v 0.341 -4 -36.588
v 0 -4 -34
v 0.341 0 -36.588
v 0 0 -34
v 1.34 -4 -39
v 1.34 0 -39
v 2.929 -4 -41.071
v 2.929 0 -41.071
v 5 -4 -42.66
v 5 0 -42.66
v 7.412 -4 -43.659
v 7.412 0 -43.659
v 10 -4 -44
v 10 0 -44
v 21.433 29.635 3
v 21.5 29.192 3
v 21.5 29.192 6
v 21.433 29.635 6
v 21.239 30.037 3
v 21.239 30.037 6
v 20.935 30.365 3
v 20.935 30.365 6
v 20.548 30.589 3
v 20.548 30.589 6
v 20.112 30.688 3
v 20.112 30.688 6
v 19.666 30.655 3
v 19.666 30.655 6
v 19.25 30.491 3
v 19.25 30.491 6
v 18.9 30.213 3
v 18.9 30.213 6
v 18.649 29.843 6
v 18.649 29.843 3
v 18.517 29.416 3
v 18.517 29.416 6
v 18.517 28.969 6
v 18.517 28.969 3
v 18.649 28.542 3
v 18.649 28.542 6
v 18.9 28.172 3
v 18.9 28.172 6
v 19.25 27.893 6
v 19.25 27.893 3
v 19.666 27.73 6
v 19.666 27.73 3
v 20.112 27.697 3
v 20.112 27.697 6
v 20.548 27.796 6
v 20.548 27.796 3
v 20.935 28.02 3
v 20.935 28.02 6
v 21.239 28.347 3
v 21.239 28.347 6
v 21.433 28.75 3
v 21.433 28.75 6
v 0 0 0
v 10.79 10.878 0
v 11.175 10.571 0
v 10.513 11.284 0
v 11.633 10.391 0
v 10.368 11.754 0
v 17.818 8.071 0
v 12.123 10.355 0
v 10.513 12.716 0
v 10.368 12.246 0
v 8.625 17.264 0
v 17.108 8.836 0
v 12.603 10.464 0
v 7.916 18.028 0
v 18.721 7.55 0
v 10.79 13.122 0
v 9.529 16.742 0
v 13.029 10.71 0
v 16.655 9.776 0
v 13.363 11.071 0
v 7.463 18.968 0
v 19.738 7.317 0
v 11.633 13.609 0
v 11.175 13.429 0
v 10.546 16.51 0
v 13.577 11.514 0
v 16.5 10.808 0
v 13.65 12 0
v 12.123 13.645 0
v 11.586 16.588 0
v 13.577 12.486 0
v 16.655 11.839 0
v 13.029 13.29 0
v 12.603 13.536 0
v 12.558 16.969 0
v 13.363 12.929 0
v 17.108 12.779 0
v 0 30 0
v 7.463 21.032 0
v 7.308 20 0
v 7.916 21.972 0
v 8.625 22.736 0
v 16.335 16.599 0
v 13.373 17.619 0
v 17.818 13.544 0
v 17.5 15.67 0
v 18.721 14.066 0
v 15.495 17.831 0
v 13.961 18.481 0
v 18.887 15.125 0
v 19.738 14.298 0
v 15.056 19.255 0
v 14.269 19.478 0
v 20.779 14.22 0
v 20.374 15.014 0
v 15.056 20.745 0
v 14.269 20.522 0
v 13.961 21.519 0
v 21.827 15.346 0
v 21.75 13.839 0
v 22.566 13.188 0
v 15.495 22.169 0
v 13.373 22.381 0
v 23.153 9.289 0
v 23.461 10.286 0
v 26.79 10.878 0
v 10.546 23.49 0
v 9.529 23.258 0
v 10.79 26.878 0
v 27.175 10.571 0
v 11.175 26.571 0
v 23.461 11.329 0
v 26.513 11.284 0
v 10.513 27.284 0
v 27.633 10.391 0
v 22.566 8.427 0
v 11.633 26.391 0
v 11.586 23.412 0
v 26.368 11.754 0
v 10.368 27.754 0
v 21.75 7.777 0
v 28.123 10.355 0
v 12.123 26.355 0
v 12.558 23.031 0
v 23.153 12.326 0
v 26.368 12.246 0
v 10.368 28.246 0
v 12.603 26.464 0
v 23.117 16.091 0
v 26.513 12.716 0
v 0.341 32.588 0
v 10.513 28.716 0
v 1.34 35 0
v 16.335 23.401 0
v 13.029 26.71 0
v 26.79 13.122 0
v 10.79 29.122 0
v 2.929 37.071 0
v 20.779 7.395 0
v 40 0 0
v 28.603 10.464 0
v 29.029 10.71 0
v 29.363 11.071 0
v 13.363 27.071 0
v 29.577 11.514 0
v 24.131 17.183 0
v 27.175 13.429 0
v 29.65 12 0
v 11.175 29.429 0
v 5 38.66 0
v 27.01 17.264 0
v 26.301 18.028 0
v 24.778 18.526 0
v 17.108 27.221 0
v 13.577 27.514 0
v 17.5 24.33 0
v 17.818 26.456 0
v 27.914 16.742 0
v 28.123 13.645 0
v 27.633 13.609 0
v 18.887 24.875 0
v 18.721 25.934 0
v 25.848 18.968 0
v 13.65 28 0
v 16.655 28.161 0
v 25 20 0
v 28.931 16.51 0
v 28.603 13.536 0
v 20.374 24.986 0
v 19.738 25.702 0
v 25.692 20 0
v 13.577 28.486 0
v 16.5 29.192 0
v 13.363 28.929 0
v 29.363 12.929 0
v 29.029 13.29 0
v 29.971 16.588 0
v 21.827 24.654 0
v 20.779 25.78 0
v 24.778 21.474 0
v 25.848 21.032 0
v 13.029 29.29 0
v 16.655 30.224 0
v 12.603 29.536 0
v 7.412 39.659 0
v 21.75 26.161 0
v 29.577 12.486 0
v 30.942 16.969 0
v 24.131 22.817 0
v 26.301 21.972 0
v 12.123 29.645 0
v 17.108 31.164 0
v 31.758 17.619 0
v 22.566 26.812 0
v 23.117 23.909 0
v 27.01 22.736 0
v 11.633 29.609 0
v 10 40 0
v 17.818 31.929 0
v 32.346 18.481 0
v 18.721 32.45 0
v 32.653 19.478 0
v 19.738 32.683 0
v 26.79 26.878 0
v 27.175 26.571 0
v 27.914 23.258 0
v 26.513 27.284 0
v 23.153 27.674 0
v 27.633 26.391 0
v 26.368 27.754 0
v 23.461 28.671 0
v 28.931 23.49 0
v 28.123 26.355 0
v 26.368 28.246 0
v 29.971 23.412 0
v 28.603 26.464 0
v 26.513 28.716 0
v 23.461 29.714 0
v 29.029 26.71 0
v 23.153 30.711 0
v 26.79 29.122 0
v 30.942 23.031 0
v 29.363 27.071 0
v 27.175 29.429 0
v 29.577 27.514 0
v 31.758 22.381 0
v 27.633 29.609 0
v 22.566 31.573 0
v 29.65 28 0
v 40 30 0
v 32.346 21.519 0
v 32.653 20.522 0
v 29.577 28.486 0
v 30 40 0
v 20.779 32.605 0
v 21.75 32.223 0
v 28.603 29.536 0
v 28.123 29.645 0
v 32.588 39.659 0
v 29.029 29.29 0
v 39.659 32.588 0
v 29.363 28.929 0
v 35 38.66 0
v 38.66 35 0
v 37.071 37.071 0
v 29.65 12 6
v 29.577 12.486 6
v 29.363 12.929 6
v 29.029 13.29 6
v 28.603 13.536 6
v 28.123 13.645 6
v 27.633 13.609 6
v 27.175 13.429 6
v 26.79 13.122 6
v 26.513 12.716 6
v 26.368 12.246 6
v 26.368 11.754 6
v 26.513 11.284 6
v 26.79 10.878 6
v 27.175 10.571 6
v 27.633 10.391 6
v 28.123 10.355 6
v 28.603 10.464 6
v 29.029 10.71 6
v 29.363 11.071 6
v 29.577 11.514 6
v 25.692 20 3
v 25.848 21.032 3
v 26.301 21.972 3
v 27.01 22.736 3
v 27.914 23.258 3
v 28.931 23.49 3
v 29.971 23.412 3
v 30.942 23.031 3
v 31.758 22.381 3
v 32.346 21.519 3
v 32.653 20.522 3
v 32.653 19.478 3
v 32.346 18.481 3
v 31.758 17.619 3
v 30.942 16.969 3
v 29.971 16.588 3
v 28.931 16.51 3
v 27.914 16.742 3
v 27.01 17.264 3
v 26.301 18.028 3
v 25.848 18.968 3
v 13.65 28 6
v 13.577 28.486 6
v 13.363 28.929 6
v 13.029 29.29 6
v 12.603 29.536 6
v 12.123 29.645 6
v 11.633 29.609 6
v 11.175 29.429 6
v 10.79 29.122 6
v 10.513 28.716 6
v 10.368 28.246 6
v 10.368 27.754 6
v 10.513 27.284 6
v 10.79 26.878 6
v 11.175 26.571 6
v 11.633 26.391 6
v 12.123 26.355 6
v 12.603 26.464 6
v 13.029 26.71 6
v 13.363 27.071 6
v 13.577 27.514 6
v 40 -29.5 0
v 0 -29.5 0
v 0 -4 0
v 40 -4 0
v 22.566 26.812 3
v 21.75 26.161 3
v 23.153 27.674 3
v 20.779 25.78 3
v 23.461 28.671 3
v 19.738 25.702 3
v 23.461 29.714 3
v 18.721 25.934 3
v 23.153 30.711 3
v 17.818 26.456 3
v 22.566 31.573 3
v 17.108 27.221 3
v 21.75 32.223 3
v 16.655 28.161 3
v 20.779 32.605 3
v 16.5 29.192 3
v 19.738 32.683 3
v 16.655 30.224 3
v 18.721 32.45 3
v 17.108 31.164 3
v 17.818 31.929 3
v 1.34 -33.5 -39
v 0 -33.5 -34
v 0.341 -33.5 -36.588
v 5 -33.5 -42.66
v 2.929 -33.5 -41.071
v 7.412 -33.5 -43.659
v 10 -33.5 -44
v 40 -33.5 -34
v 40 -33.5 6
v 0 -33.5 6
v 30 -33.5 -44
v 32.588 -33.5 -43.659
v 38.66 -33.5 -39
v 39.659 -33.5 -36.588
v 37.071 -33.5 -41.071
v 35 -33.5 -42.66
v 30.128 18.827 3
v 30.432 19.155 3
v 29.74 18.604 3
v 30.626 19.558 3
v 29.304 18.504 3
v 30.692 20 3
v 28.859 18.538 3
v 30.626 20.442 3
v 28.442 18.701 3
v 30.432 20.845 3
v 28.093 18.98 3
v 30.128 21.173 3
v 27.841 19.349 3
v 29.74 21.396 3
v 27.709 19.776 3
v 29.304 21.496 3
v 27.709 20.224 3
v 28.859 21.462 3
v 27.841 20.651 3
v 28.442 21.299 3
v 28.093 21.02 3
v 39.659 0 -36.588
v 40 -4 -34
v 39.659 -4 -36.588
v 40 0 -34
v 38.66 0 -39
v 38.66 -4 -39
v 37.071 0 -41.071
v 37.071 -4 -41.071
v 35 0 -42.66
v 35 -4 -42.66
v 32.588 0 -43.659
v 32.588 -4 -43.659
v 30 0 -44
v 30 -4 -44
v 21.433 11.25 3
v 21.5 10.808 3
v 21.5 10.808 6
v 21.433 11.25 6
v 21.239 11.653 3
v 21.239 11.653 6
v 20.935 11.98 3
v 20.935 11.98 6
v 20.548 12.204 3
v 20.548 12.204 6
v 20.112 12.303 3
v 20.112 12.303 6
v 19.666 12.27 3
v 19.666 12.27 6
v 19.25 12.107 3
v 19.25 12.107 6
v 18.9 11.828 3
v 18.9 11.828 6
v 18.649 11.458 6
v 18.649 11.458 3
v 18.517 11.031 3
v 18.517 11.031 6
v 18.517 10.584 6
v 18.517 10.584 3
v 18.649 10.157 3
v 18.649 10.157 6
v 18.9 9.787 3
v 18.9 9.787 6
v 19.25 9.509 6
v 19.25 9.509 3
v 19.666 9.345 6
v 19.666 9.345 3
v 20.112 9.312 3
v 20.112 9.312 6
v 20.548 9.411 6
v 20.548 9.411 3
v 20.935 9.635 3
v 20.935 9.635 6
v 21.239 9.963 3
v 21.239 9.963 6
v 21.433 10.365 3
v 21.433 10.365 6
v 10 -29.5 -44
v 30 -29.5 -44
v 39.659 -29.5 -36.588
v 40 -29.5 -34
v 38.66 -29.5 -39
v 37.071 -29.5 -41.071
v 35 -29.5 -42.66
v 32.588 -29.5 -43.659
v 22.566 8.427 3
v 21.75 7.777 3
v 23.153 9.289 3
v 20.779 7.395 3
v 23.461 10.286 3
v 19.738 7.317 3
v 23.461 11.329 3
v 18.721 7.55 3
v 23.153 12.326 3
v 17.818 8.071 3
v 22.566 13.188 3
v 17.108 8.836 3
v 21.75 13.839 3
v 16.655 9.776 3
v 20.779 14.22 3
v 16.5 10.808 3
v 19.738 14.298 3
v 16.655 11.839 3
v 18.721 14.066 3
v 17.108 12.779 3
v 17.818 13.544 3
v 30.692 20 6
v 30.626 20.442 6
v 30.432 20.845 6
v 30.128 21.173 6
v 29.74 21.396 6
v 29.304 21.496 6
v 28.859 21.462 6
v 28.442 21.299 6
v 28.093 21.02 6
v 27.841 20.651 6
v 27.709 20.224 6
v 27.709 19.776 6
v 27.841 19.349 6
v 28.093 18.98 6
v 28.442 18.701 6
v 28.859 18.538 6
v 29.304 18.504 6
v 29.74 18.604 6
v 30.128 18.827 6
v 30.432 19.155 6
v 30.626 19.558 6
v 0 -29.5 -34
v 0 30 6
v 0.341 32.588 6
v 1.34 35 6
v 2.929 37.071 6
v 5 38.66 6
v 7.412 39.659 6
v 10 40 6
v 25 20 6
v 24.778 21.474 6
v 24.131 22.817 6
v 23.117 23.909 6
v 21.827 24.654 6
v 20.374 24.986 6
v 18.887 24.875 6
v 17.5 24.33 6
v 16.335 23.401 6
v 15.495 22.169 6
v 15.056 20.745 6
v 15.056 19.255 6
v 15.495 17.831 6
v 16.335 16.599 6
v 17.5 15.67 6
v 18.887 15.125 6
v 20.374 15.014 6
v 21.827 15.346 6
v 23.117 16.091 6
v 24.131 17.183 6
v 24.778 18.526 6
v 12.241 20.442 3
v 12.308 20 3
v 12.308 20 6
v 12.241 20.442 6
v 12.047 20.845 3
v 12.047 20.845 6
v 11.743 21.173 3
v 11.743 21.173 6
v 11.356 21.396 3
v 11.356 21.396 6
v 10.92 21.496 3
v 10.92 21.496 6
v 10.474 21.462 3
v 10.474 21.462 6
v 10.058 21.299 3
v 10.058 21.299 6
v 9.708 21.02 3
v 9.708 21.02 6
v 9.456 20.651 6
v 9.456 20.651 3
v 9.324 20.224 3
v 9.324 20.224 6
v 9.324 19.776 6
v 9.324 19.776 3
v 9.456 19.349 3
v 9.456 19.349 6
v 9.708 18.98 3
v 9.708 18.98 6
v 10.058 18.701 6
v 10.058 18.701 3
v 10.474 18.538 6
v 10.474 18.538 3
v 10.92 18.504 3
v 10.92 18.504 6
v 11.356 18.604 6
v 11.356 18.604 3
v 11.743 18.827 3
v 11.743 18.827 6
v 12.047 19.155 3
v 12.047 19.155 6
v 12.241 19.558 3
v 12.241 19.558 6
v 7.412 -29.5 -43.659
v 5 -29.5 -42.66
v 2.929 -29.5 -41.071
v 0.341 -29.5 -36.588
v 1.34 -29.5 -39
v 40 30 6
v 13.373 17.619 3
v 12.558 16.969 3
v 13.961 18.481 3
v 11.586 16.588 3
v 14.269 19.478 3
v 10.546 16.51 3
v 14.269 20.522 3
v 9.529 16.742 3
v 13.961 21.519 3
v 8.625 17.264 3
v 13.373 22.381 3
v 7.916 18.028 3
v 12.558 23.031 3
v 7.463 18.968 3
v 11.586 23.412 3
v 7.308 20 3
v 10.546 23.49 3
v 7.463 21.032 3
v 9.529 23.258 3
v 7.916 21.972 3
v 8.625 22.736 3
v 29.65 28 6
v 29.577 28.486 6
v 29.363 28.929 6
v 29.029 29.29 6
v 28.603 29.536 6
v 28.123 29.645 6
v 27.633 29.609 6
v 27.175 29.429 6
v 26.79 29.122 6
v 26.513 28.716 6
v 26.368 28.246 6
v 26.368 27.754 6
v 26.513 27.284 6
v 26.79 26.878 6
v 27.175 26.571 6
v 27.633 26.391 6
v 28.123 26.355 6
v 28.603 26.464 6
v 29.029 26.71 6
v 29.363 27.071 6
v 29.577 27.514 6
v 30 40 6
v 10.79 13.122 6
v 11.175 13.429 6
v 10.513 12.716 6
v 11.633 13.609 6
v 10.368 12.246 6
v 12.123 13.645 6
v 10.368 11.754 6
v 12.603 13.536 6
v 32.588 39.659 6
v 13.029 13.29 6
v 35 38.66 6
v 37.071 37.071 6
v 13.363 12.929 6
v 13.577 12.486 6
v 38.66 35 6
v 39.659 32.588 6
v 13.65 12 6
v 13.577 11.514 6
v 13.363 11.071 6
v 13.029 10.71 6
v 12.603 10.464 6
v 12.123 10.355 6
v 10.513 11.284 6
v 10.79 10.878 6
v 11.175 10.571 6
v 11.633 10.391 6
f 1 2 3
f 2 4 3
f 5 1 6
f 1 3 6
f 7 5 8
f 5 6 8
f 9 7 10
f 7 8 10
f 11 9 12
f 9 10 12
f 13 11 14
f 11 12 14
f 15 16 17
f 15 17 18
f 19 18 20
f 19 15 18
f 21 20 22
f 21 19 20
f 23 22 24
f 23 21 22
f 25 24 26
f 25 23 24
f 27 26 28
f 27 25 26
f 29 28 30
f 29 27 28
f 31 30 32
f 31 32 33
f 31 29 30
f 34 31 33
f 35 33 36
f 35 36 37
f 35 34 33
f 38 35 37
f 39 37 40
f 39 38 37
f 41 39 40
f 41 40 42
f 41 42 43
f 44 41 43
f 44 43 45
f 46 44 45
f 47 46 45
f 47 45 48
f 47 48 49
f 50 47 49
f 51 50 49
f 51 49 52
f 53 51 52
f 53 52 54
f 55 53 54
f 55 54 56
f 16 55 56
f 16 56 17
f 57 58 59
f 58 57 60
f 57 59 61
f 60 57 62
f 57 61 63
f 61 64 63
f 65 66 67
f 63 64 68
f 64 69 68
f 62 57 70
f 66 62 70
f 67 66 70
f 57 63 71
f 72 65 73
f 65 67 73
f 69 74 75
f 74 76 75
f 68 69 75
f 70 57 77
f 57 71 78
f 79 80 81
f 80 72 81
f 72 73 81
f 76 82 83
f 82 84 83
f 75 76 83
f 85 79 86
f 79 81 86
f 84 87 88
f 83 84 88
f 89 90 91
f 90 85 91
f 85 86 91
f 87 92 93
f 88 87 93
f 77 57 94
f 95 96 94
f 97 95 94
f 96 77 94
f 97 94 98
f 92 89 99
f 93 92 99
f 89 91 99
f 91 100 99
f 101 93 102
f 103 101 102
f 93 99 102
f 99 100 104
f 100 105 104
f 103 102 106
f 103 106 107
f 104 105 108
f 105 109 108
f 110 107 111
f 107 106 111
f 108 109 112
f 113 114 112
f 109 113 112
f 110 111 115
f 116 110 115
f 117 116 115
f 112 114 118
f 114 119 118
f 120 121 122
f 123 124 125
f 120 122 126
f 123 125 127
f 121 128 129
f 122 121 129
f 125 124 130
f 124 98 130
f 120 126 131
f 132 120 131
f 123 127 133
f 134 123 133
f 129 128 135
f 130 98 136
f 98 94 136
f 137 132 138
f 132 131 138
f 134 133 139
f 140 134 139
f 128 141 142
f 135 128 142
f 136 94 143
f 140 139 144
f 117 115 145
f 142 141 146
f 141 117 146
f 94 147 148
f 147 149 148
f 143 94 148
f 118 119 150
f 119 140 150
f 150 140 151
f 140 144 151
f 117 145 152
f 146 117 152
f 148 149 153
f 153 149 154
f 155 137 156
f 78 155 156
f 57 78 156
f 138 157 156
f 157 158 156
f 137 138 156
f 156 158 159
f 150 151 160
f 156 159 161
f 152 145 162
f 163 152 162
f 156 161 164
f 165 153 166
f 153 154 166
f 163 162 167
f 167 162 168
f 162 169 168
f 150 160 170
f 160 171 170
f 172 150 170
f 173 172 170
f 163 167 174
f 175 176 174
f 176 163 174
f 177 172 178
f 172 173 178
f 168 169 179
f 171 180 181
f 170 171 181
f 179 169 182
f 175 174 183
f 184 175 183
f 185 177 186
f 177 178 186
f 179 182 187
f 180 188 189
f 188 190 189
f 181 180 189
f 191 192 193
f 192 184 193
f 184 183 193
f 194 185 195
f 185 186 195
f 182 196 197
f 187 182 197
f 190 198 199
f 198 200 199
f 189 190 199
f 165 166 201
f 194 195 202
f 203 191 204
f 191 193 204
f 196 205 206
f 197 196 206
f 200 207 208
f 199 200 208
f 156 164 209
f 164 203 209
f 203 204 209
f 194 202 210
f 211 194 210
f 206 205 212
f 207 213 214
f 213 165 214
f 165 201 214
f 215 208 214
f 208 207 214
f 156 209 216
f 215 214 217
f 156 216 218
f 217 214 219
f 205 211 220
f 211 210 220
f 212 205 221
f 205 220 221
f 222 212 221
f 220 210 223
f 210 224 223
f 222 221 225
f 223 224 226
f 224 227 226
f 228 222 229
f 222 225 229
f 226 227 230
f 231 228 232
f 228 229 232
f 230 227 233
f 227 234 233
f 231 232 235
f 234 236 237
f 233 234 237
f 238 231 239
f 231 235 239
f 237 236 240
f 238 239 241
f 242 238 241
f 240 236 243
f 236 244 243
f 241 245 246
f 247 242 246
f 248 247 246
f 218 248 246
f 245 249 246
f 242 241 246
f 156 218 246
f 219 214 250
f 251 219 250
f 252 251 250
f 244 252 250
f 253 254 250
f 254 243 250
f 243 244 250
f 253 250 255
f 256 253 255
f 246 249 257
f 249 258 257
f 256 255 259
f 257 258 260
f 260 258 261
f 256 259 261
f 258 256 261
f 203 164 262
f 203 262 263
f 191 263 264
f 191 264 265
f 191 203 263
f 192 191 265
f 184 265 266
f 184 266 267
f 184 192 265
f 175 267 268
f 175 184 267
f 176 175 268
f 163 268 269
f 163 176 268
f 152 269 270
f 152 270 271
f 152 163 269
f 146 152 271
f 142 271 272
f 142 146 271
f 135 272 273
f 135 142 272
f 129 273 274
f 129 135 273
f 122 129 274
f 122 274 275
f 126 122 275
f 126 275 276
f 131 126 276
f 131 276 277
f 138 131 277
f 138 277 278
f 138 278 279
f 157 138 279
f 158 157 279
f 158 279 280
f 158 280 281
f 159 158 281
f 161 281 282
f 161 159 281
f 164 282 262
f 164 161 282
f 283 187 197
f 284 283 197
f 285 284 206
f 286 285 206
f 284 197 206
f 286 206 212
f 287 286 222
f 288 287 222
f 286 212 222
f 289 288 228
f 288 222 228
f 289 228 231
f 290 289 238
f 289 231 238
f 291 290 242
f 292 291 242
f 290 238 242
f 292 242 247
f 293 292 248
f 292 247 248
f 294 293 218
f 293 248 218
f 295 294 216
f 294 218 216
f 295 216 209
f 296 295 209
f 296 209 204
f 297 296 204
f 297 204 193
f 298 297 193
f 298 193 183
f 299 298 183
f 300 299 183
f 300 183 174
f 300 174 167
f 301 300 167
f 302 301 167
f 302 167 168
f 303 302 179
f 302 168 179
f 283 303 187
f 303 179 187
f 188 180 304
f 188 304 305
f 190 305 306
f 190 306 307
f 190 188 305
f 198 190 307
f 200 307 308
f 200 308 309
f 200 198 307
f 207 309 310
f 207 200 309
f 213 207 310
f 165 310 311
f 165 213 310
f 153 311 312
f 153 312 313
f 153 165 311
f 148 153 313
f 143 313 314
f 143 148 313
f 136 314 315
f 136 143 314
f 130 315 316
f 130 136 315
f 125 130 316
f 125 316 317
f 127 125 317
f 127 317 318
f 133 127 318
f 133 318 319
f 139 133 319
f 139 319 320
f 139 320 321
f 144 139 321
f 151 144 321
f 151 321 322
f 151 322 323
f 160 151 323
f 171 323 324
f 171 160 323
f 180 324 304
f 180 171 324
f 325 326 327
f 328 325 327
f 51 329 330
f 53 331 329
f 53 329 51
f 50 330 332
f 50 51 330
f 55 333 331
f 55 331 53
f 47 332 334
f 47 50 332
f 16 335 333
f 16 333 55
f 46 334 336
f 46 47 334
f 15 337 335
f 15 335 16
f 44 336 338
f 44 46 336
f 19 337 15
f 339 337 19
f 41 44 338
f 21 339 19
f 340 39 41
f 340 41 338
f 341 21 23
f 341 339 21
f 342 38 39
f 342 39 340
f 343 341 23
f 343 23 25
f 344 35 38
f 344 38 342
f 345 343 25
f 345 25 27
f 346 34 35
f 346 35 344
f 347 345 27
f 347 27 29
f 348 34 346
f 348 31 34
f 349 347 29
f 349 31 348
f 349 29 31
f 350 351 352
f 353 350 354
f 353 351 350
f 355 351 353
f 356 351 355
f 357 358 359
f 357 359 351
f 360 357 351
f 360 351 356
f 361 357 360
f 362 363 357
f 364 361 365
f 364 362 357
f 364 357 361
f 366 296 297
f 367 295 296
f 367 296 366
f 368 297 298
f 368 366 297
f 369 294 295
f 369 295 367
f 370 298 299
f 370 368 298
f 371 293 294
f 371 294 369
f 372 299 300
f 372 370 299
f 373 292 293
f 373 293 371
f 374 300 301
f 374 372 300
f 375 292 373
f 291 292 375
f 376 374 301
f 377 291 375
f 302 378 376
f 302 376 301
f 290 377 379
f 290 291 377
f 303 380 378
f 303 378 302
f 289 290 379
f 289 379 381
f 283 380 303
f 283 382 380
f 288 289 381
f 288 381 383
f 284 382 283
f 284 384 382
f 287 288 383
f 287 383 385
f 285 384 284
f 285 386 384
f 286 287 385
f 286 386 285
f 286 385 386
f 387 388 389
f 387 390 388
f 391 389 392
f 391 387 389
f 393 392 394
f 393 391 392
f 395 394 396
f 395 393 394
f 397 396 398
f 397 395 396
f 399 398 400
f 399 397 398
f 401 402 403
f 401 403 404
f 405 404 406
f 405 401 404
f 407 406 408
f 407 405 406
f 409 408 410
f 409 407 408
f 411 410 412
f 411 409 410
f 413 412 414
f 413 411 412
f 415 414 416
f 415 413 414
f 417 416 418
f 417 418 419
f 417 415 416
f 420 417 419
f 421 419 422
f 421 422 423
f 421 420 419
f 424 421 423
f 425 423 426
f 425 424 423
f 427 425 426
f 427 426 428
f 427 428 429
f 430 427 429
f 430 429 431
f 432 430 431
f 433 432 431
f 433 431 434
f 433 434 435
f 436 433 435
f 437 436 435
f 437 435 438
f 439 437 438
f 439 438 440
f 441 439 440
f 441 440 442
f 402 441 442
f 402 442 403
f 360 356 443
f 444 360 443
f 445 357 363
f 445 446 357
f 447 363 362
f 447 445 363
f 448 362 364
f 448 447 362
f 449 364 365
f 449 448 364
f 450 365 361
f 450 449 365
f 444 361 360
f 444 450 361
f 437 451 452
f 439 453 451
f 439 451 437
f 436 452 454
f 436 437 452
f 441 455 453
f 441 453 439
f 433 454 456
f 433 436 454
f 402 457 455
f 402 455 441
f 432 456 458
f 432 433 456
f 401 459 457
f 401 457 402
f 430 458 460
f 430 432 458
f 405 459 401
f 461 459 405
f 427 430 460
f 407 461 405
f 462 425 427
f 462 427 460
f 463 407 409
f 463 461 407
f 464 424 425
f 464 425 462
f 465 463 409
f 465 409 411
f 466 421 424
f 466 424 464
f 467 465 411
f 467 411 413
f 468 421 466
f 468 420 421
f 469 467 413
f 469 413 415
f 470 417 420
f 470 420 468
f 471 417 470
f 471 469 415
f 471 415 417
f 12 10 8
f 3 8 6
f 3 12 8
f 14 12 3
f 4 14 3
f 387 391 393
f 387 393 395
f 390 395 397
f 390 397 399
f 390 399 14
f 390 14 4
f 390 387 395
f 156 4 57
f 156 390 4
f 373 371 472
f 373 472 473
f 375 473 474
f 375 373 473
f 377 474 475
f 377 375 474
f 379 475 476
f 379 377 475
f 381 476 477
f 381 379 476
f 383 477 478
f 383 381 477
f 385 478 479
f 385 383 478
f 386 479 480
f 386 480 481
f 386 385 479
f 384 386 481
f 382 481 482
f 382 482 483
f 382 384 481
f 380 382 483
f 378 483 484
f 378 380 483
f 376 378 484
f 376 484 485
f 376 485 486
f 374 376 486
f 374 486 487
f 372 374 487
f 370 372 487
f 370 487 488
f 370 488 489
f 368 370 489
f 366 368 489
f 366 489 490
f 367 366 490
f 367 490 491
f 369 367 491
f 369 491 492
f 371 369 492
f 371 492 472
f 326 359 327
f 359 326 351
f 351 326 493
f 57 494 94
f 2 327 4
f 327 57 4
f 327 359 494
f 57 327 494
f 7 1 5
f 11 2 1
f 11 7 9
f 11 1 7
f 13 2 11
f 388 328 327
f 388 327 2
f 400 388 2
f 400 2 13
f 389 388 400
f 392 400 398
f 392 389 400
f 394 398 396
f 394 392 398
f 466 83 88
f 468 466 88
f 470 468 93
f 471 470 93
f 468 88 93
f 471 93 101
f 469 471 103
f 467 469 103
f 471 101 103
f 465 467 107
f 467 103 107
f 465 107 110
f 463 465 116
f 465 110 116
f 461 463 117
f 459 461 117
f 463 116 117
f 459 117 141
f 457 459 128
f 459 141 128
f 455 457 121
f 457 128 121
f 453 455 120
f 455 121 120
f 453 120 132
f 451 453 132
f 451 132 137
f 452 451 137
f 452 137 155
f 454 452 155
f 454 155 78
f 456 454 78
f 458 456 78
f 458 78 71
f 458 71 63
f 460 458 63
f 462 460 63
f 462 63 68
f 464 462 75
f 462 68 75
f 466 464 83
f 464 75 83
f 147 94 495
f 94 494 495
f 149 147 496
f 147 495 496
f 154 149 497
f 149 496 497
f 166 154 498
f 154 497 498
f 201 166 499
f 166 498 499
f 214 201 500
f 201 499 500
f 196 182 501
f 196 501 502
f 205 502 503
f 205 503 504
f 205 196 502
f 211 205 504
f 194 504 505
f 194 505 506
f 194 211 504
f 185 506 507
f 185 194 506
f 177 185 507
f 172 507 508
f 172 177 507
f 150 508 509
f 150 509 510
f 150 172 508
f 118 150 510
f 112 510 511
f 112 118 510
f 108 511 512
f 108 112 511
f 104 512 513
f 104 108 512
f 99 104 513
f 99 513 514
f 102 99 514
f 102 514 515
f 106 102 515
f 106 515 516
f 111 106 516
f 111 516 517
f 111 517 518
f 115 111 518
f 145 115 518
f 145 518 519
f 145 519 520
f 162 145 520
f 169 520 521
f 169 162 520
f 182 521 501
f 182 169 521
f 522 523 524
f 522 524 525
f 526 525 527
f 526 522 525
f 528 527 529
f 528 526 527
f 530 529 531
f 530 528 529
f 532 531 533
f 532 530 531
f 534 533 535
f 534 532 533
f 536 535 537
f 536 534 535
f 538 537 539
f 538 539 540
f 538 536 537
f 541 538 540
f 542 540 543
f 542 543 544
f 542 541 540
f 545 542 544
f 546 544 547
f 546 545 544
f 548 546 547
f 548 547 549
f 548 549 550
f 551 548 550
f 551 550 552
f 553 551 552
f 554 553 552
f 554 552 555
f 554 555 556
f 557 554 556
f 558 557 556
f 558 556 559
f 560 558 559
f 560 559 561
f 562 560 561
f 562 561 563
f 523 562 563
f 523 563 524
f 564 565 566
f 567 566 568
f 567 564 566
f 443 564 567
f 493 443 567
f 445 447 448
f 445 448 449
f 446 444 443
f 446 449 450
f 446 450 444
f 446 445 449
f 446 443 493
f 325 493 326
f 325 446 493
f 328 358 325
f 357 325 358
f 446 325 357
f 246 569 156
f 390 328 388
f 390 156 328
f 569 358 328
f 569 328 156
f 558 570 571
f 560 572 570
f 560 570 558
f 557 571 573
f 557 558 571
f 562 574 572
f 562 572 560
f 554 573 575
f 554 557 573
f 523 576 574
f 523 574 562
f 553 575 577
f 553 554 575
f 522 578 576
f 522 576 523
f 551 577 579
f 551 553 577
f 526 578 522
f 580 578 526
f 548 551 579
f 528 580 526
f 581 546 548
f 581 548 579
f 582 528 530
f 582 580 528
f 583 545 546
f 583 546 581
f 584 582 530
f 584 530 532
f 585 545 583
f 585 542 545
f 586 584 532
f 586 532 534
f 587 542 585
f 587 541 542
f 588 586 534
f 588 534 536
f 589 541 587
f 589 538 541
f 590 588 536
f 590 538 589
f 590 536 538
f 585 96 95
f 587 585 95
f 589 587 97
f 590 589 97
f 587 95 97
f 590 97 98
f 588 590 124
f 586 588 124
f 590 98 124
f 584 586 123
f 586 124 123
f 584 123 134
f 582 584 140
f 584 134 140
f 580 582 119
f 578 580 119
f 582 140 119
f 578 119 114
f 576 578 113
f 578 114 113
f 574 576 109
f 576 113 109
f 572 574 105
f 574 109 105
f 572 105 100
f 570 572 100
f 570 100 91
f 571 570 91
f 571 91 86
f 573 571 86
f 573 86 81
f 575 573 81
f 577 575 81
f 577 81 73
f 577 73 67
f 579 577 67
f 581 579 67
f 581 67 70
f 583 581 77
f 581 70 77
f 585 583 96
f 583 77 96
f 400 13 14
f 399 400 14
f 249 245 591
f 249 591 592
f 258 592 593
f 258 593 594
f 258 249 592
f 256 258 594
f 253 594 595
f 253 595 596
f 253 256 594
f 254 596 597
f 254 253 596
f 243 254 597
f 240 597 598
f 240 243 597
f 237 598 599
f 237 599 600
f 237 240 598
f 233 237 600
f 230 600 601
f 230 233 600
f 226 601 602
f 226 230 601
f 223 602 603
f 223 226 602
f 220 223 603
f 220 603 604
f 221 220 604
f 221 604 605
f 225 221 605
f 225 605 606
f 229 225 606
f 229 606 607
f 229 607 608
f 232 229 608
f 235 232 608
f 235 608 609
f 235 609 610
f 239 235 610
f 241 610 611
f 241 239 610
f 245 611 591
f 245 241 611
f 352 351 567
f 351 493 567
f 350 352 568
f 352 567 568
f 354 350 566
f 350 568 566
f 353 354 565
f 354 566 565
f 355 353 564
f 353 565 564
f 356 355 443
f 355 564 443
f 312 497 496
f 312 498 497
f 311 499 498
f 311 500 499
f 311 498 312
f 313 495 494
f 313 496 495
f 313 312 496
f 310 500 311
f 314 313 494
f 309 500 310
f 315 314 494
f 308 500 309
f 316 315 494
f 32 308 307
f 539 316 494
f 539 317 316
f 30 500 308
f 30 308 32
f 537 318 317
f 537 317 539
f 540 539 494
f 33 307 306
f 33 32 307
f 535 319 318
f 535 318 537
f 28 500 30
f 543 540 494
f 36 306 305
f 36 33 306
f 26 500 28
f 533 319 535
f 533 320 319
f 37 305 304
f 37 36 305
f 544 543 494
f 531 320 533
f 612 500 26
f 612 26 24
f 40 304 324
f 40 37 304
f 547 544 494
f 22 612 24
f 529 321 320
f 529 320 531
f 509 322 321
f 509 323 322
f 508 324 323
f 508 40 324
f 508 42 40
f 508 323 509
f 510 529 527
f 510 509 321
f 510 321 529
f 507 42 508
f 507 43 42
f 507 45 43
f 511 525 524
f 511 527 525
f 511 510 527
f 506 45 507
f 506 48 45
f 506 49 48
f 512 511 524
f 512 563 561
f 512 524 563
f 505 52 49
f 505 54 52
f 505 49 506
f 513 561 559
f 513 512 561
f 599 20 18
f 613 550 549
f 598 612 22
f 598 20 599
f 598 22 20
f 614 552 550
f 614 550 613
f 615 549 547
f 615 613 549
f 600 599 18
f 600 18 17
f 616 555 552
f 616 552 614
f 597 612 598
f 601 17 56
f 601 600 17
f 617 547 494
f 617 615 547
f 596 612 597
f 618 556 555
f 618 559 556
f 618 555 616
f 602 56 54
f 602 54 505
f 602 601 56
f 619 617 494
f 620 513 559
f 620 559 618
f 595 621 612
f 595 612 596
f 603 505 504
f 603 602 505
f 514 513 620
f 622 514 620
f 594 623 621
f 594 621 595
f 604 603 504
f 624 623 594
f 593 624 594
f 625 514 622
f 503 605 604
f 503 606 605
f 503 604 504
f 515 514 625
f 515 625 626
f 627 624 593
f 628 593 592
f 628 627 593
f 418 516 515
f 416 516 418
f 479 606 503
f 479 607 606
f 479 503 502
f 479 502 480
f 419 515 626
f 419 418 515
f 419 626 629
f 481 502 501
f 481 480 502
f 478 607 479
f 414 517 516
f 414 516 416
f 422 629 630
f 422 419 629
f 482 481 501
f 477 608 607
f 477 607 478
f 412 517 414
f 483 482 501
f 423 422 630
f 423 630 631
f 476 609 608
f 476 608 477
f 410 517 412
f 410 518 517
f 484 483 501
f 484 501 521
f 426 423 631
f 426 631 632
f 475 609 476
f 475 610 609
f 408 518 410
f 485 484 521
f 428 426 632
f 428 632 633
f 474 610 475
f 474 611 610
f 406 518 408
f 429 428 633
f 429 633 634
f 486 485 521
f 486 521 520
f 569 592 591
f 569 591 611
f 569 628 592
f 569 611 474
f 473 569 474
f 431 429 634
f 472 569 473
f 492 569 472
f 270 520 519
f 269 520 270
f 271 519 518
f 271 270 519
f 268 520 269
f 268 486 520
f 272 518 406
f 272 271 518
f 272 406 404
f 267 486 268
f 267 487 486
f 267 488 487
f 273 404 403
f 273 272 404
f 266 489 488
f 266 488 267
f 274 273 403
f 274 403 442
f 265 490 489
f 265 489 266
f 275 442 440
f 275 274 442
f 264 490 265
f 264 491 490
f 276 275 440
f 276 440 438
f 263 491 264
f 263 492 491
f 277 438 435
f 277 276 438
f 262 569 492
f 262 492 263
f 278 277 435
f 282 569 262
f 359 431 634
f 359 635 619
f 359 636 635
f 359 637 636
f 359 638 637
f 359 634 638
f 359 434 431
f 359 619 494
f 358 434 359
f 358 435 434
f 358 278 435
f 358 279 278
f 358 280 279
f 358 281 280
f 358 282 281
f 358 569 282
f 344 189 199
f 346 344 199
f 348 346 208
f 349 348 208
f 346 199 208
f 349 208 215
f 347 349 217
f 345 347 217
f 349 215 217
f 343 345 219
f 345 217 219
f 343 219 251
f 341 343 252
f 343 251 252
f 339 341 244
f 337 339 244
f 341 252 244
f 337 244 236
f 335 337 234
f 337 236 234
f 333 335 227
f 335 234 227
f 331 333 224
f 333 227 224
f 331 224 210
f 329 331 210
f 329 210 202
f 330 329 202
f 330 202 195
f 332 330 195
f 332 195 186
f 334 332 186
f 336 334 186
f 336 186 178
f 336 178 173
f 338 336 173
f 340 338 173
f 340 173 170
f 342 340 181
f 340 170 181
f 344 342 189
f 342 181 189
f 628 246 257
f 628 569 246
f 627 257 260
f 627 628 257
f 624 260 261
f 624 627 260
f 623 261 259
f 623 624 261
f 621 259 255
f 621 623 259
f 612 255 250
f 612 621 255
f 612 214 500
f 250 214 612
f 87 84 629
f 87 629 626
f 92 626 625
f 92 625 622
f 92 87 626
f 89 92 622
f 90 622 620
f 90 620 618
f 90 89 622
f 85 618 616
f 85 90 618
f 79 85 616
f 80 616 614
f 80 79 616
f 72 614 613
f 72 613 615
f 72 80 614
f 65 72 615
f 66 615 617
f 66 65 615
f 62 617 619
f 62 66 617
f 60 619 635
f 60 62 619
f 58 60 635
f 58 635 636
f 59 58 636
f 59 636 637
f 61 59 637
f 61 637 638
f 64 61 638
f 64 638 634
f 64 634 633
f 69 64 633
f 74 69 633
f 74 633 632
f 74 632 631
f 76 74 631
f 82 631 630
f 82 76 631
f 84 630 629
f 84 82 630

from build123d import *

# Parameters (mm, degrees)
SKETCH1_W           = 40
SKETCH1_H           = 40
SKETCH1_R           = 5
SKETCH1_R_2         = 1.65
SKETCH1_R_3         = 1.5
BOSS_EXTRUDE1_DEPTH = 6
SKETCH2_W           = 6
SKETCH2_H           = 25.5
BOSS_EXTRUDE2_DEPTH = 40
SKETCH3_R           = 3.5
CUT_EXTRUDE1_DEPTH  = 3
FILLET1_R           = 10


with BuildPart() as part:
    # Sketch1 → Boss-Extrude1 (new body)
    with BuildSketch(Plane.XY):
        with Locations((20, 20)):
            Rectangle(SKETCH1_W, SKETCH1_H)
        with Locations((20, 20)):
            Circle(SKETCH1_R, mode=Mode.SUBTRACT)
        with Locations((12, 28)):
            Circle(SKETCH1_R_2, mode=Mode.SUBTRACT)
        with Locations((20, 29.192388155)):
            Circle(SKETCH1_R_3, mode=Mode.SUBTRACT)
        with Locations((29.192388155, 20)):
            Circle(SKETCH1_R_3, mode=Mode.SUBTRACT)
        with Locations((20, 10.807611845)):
            Circle(SKETCH1_R_3, mode=Mode.SUBTRACT)
        with Locations((10.807611845, 20)):
            Circle(SKETCH1_R_3, mode=Mode.SUBTRACT)
        with Locations((28, 28)):
            Circle(SKETCH1_R_2, mode=Mode.SUBTRACT)
        with Locations((12, 12)):
            Circle(SKETCH1_R_2, mode=Mode.SUBTRACT)
        with Locations((28, 12)):
            Circle(SKETCH1_R_2, mode=Mode.SUBTRACT)
    extrude(amount=BOSS_EXTRUDE1_DEPTH)

    # Sketch2 → Boss-Extrude2 (add)
    with BuildSketch(Plane(origin=(40, 0, 0), x_dir=(0, 0, -1), z_dir=(1, 0, 0))):
        Polygon((44, 0), (-6, 0), (-6, -4), (0, -4), (44, -4), align=None)
        with Locations((-3, -16.75)):
            Rectangle(SKETCH2_W, SKETCH2_H)
        Polygon((0, -29.5), (-6, -29.5), (-6, -33.5), (44, -33.5), (44, -29.5), align=None)
    extrude(amount=-BOSS_EXTRUDE2_DEPTH)

    # Sketch3 → Cut-Extrude1 (cut)
    with BuildSketch(Plane(origin=(0, 0, 0), x_dir=(-1, 0, 0), z_dir=(0, 0, -1))):
        with Locations((-20, 29.192388155)):
            Circle(SKETCH3_R)
        with Locations((-20, 10.807611845)):
            Circle(SKETCH3_R)
        with Locations((-29.192388155, 20)):
            Circle(SKETCH3_R)
        with Locations((-10.807611845, 20)):
            Circle(SKETCH3_R)
    extrude(amount=-CUT_EXTRUDE1_DEPTH, mode=Mode.SUBTRACT)

    # Fillet1
    fillet1_edges = [part.edges().sort_by_distance(p)[0] for p in [
        (40, -2, -44),
        (0, -31.5, -44),
        (0, -2, -44),
        (40, -31.5, -44),
        (0, 40, 3),
        (40, 40, 3),
    ]]
    fillet(fillet1_edges, radius=FILLET1_R)


solid = part.part
